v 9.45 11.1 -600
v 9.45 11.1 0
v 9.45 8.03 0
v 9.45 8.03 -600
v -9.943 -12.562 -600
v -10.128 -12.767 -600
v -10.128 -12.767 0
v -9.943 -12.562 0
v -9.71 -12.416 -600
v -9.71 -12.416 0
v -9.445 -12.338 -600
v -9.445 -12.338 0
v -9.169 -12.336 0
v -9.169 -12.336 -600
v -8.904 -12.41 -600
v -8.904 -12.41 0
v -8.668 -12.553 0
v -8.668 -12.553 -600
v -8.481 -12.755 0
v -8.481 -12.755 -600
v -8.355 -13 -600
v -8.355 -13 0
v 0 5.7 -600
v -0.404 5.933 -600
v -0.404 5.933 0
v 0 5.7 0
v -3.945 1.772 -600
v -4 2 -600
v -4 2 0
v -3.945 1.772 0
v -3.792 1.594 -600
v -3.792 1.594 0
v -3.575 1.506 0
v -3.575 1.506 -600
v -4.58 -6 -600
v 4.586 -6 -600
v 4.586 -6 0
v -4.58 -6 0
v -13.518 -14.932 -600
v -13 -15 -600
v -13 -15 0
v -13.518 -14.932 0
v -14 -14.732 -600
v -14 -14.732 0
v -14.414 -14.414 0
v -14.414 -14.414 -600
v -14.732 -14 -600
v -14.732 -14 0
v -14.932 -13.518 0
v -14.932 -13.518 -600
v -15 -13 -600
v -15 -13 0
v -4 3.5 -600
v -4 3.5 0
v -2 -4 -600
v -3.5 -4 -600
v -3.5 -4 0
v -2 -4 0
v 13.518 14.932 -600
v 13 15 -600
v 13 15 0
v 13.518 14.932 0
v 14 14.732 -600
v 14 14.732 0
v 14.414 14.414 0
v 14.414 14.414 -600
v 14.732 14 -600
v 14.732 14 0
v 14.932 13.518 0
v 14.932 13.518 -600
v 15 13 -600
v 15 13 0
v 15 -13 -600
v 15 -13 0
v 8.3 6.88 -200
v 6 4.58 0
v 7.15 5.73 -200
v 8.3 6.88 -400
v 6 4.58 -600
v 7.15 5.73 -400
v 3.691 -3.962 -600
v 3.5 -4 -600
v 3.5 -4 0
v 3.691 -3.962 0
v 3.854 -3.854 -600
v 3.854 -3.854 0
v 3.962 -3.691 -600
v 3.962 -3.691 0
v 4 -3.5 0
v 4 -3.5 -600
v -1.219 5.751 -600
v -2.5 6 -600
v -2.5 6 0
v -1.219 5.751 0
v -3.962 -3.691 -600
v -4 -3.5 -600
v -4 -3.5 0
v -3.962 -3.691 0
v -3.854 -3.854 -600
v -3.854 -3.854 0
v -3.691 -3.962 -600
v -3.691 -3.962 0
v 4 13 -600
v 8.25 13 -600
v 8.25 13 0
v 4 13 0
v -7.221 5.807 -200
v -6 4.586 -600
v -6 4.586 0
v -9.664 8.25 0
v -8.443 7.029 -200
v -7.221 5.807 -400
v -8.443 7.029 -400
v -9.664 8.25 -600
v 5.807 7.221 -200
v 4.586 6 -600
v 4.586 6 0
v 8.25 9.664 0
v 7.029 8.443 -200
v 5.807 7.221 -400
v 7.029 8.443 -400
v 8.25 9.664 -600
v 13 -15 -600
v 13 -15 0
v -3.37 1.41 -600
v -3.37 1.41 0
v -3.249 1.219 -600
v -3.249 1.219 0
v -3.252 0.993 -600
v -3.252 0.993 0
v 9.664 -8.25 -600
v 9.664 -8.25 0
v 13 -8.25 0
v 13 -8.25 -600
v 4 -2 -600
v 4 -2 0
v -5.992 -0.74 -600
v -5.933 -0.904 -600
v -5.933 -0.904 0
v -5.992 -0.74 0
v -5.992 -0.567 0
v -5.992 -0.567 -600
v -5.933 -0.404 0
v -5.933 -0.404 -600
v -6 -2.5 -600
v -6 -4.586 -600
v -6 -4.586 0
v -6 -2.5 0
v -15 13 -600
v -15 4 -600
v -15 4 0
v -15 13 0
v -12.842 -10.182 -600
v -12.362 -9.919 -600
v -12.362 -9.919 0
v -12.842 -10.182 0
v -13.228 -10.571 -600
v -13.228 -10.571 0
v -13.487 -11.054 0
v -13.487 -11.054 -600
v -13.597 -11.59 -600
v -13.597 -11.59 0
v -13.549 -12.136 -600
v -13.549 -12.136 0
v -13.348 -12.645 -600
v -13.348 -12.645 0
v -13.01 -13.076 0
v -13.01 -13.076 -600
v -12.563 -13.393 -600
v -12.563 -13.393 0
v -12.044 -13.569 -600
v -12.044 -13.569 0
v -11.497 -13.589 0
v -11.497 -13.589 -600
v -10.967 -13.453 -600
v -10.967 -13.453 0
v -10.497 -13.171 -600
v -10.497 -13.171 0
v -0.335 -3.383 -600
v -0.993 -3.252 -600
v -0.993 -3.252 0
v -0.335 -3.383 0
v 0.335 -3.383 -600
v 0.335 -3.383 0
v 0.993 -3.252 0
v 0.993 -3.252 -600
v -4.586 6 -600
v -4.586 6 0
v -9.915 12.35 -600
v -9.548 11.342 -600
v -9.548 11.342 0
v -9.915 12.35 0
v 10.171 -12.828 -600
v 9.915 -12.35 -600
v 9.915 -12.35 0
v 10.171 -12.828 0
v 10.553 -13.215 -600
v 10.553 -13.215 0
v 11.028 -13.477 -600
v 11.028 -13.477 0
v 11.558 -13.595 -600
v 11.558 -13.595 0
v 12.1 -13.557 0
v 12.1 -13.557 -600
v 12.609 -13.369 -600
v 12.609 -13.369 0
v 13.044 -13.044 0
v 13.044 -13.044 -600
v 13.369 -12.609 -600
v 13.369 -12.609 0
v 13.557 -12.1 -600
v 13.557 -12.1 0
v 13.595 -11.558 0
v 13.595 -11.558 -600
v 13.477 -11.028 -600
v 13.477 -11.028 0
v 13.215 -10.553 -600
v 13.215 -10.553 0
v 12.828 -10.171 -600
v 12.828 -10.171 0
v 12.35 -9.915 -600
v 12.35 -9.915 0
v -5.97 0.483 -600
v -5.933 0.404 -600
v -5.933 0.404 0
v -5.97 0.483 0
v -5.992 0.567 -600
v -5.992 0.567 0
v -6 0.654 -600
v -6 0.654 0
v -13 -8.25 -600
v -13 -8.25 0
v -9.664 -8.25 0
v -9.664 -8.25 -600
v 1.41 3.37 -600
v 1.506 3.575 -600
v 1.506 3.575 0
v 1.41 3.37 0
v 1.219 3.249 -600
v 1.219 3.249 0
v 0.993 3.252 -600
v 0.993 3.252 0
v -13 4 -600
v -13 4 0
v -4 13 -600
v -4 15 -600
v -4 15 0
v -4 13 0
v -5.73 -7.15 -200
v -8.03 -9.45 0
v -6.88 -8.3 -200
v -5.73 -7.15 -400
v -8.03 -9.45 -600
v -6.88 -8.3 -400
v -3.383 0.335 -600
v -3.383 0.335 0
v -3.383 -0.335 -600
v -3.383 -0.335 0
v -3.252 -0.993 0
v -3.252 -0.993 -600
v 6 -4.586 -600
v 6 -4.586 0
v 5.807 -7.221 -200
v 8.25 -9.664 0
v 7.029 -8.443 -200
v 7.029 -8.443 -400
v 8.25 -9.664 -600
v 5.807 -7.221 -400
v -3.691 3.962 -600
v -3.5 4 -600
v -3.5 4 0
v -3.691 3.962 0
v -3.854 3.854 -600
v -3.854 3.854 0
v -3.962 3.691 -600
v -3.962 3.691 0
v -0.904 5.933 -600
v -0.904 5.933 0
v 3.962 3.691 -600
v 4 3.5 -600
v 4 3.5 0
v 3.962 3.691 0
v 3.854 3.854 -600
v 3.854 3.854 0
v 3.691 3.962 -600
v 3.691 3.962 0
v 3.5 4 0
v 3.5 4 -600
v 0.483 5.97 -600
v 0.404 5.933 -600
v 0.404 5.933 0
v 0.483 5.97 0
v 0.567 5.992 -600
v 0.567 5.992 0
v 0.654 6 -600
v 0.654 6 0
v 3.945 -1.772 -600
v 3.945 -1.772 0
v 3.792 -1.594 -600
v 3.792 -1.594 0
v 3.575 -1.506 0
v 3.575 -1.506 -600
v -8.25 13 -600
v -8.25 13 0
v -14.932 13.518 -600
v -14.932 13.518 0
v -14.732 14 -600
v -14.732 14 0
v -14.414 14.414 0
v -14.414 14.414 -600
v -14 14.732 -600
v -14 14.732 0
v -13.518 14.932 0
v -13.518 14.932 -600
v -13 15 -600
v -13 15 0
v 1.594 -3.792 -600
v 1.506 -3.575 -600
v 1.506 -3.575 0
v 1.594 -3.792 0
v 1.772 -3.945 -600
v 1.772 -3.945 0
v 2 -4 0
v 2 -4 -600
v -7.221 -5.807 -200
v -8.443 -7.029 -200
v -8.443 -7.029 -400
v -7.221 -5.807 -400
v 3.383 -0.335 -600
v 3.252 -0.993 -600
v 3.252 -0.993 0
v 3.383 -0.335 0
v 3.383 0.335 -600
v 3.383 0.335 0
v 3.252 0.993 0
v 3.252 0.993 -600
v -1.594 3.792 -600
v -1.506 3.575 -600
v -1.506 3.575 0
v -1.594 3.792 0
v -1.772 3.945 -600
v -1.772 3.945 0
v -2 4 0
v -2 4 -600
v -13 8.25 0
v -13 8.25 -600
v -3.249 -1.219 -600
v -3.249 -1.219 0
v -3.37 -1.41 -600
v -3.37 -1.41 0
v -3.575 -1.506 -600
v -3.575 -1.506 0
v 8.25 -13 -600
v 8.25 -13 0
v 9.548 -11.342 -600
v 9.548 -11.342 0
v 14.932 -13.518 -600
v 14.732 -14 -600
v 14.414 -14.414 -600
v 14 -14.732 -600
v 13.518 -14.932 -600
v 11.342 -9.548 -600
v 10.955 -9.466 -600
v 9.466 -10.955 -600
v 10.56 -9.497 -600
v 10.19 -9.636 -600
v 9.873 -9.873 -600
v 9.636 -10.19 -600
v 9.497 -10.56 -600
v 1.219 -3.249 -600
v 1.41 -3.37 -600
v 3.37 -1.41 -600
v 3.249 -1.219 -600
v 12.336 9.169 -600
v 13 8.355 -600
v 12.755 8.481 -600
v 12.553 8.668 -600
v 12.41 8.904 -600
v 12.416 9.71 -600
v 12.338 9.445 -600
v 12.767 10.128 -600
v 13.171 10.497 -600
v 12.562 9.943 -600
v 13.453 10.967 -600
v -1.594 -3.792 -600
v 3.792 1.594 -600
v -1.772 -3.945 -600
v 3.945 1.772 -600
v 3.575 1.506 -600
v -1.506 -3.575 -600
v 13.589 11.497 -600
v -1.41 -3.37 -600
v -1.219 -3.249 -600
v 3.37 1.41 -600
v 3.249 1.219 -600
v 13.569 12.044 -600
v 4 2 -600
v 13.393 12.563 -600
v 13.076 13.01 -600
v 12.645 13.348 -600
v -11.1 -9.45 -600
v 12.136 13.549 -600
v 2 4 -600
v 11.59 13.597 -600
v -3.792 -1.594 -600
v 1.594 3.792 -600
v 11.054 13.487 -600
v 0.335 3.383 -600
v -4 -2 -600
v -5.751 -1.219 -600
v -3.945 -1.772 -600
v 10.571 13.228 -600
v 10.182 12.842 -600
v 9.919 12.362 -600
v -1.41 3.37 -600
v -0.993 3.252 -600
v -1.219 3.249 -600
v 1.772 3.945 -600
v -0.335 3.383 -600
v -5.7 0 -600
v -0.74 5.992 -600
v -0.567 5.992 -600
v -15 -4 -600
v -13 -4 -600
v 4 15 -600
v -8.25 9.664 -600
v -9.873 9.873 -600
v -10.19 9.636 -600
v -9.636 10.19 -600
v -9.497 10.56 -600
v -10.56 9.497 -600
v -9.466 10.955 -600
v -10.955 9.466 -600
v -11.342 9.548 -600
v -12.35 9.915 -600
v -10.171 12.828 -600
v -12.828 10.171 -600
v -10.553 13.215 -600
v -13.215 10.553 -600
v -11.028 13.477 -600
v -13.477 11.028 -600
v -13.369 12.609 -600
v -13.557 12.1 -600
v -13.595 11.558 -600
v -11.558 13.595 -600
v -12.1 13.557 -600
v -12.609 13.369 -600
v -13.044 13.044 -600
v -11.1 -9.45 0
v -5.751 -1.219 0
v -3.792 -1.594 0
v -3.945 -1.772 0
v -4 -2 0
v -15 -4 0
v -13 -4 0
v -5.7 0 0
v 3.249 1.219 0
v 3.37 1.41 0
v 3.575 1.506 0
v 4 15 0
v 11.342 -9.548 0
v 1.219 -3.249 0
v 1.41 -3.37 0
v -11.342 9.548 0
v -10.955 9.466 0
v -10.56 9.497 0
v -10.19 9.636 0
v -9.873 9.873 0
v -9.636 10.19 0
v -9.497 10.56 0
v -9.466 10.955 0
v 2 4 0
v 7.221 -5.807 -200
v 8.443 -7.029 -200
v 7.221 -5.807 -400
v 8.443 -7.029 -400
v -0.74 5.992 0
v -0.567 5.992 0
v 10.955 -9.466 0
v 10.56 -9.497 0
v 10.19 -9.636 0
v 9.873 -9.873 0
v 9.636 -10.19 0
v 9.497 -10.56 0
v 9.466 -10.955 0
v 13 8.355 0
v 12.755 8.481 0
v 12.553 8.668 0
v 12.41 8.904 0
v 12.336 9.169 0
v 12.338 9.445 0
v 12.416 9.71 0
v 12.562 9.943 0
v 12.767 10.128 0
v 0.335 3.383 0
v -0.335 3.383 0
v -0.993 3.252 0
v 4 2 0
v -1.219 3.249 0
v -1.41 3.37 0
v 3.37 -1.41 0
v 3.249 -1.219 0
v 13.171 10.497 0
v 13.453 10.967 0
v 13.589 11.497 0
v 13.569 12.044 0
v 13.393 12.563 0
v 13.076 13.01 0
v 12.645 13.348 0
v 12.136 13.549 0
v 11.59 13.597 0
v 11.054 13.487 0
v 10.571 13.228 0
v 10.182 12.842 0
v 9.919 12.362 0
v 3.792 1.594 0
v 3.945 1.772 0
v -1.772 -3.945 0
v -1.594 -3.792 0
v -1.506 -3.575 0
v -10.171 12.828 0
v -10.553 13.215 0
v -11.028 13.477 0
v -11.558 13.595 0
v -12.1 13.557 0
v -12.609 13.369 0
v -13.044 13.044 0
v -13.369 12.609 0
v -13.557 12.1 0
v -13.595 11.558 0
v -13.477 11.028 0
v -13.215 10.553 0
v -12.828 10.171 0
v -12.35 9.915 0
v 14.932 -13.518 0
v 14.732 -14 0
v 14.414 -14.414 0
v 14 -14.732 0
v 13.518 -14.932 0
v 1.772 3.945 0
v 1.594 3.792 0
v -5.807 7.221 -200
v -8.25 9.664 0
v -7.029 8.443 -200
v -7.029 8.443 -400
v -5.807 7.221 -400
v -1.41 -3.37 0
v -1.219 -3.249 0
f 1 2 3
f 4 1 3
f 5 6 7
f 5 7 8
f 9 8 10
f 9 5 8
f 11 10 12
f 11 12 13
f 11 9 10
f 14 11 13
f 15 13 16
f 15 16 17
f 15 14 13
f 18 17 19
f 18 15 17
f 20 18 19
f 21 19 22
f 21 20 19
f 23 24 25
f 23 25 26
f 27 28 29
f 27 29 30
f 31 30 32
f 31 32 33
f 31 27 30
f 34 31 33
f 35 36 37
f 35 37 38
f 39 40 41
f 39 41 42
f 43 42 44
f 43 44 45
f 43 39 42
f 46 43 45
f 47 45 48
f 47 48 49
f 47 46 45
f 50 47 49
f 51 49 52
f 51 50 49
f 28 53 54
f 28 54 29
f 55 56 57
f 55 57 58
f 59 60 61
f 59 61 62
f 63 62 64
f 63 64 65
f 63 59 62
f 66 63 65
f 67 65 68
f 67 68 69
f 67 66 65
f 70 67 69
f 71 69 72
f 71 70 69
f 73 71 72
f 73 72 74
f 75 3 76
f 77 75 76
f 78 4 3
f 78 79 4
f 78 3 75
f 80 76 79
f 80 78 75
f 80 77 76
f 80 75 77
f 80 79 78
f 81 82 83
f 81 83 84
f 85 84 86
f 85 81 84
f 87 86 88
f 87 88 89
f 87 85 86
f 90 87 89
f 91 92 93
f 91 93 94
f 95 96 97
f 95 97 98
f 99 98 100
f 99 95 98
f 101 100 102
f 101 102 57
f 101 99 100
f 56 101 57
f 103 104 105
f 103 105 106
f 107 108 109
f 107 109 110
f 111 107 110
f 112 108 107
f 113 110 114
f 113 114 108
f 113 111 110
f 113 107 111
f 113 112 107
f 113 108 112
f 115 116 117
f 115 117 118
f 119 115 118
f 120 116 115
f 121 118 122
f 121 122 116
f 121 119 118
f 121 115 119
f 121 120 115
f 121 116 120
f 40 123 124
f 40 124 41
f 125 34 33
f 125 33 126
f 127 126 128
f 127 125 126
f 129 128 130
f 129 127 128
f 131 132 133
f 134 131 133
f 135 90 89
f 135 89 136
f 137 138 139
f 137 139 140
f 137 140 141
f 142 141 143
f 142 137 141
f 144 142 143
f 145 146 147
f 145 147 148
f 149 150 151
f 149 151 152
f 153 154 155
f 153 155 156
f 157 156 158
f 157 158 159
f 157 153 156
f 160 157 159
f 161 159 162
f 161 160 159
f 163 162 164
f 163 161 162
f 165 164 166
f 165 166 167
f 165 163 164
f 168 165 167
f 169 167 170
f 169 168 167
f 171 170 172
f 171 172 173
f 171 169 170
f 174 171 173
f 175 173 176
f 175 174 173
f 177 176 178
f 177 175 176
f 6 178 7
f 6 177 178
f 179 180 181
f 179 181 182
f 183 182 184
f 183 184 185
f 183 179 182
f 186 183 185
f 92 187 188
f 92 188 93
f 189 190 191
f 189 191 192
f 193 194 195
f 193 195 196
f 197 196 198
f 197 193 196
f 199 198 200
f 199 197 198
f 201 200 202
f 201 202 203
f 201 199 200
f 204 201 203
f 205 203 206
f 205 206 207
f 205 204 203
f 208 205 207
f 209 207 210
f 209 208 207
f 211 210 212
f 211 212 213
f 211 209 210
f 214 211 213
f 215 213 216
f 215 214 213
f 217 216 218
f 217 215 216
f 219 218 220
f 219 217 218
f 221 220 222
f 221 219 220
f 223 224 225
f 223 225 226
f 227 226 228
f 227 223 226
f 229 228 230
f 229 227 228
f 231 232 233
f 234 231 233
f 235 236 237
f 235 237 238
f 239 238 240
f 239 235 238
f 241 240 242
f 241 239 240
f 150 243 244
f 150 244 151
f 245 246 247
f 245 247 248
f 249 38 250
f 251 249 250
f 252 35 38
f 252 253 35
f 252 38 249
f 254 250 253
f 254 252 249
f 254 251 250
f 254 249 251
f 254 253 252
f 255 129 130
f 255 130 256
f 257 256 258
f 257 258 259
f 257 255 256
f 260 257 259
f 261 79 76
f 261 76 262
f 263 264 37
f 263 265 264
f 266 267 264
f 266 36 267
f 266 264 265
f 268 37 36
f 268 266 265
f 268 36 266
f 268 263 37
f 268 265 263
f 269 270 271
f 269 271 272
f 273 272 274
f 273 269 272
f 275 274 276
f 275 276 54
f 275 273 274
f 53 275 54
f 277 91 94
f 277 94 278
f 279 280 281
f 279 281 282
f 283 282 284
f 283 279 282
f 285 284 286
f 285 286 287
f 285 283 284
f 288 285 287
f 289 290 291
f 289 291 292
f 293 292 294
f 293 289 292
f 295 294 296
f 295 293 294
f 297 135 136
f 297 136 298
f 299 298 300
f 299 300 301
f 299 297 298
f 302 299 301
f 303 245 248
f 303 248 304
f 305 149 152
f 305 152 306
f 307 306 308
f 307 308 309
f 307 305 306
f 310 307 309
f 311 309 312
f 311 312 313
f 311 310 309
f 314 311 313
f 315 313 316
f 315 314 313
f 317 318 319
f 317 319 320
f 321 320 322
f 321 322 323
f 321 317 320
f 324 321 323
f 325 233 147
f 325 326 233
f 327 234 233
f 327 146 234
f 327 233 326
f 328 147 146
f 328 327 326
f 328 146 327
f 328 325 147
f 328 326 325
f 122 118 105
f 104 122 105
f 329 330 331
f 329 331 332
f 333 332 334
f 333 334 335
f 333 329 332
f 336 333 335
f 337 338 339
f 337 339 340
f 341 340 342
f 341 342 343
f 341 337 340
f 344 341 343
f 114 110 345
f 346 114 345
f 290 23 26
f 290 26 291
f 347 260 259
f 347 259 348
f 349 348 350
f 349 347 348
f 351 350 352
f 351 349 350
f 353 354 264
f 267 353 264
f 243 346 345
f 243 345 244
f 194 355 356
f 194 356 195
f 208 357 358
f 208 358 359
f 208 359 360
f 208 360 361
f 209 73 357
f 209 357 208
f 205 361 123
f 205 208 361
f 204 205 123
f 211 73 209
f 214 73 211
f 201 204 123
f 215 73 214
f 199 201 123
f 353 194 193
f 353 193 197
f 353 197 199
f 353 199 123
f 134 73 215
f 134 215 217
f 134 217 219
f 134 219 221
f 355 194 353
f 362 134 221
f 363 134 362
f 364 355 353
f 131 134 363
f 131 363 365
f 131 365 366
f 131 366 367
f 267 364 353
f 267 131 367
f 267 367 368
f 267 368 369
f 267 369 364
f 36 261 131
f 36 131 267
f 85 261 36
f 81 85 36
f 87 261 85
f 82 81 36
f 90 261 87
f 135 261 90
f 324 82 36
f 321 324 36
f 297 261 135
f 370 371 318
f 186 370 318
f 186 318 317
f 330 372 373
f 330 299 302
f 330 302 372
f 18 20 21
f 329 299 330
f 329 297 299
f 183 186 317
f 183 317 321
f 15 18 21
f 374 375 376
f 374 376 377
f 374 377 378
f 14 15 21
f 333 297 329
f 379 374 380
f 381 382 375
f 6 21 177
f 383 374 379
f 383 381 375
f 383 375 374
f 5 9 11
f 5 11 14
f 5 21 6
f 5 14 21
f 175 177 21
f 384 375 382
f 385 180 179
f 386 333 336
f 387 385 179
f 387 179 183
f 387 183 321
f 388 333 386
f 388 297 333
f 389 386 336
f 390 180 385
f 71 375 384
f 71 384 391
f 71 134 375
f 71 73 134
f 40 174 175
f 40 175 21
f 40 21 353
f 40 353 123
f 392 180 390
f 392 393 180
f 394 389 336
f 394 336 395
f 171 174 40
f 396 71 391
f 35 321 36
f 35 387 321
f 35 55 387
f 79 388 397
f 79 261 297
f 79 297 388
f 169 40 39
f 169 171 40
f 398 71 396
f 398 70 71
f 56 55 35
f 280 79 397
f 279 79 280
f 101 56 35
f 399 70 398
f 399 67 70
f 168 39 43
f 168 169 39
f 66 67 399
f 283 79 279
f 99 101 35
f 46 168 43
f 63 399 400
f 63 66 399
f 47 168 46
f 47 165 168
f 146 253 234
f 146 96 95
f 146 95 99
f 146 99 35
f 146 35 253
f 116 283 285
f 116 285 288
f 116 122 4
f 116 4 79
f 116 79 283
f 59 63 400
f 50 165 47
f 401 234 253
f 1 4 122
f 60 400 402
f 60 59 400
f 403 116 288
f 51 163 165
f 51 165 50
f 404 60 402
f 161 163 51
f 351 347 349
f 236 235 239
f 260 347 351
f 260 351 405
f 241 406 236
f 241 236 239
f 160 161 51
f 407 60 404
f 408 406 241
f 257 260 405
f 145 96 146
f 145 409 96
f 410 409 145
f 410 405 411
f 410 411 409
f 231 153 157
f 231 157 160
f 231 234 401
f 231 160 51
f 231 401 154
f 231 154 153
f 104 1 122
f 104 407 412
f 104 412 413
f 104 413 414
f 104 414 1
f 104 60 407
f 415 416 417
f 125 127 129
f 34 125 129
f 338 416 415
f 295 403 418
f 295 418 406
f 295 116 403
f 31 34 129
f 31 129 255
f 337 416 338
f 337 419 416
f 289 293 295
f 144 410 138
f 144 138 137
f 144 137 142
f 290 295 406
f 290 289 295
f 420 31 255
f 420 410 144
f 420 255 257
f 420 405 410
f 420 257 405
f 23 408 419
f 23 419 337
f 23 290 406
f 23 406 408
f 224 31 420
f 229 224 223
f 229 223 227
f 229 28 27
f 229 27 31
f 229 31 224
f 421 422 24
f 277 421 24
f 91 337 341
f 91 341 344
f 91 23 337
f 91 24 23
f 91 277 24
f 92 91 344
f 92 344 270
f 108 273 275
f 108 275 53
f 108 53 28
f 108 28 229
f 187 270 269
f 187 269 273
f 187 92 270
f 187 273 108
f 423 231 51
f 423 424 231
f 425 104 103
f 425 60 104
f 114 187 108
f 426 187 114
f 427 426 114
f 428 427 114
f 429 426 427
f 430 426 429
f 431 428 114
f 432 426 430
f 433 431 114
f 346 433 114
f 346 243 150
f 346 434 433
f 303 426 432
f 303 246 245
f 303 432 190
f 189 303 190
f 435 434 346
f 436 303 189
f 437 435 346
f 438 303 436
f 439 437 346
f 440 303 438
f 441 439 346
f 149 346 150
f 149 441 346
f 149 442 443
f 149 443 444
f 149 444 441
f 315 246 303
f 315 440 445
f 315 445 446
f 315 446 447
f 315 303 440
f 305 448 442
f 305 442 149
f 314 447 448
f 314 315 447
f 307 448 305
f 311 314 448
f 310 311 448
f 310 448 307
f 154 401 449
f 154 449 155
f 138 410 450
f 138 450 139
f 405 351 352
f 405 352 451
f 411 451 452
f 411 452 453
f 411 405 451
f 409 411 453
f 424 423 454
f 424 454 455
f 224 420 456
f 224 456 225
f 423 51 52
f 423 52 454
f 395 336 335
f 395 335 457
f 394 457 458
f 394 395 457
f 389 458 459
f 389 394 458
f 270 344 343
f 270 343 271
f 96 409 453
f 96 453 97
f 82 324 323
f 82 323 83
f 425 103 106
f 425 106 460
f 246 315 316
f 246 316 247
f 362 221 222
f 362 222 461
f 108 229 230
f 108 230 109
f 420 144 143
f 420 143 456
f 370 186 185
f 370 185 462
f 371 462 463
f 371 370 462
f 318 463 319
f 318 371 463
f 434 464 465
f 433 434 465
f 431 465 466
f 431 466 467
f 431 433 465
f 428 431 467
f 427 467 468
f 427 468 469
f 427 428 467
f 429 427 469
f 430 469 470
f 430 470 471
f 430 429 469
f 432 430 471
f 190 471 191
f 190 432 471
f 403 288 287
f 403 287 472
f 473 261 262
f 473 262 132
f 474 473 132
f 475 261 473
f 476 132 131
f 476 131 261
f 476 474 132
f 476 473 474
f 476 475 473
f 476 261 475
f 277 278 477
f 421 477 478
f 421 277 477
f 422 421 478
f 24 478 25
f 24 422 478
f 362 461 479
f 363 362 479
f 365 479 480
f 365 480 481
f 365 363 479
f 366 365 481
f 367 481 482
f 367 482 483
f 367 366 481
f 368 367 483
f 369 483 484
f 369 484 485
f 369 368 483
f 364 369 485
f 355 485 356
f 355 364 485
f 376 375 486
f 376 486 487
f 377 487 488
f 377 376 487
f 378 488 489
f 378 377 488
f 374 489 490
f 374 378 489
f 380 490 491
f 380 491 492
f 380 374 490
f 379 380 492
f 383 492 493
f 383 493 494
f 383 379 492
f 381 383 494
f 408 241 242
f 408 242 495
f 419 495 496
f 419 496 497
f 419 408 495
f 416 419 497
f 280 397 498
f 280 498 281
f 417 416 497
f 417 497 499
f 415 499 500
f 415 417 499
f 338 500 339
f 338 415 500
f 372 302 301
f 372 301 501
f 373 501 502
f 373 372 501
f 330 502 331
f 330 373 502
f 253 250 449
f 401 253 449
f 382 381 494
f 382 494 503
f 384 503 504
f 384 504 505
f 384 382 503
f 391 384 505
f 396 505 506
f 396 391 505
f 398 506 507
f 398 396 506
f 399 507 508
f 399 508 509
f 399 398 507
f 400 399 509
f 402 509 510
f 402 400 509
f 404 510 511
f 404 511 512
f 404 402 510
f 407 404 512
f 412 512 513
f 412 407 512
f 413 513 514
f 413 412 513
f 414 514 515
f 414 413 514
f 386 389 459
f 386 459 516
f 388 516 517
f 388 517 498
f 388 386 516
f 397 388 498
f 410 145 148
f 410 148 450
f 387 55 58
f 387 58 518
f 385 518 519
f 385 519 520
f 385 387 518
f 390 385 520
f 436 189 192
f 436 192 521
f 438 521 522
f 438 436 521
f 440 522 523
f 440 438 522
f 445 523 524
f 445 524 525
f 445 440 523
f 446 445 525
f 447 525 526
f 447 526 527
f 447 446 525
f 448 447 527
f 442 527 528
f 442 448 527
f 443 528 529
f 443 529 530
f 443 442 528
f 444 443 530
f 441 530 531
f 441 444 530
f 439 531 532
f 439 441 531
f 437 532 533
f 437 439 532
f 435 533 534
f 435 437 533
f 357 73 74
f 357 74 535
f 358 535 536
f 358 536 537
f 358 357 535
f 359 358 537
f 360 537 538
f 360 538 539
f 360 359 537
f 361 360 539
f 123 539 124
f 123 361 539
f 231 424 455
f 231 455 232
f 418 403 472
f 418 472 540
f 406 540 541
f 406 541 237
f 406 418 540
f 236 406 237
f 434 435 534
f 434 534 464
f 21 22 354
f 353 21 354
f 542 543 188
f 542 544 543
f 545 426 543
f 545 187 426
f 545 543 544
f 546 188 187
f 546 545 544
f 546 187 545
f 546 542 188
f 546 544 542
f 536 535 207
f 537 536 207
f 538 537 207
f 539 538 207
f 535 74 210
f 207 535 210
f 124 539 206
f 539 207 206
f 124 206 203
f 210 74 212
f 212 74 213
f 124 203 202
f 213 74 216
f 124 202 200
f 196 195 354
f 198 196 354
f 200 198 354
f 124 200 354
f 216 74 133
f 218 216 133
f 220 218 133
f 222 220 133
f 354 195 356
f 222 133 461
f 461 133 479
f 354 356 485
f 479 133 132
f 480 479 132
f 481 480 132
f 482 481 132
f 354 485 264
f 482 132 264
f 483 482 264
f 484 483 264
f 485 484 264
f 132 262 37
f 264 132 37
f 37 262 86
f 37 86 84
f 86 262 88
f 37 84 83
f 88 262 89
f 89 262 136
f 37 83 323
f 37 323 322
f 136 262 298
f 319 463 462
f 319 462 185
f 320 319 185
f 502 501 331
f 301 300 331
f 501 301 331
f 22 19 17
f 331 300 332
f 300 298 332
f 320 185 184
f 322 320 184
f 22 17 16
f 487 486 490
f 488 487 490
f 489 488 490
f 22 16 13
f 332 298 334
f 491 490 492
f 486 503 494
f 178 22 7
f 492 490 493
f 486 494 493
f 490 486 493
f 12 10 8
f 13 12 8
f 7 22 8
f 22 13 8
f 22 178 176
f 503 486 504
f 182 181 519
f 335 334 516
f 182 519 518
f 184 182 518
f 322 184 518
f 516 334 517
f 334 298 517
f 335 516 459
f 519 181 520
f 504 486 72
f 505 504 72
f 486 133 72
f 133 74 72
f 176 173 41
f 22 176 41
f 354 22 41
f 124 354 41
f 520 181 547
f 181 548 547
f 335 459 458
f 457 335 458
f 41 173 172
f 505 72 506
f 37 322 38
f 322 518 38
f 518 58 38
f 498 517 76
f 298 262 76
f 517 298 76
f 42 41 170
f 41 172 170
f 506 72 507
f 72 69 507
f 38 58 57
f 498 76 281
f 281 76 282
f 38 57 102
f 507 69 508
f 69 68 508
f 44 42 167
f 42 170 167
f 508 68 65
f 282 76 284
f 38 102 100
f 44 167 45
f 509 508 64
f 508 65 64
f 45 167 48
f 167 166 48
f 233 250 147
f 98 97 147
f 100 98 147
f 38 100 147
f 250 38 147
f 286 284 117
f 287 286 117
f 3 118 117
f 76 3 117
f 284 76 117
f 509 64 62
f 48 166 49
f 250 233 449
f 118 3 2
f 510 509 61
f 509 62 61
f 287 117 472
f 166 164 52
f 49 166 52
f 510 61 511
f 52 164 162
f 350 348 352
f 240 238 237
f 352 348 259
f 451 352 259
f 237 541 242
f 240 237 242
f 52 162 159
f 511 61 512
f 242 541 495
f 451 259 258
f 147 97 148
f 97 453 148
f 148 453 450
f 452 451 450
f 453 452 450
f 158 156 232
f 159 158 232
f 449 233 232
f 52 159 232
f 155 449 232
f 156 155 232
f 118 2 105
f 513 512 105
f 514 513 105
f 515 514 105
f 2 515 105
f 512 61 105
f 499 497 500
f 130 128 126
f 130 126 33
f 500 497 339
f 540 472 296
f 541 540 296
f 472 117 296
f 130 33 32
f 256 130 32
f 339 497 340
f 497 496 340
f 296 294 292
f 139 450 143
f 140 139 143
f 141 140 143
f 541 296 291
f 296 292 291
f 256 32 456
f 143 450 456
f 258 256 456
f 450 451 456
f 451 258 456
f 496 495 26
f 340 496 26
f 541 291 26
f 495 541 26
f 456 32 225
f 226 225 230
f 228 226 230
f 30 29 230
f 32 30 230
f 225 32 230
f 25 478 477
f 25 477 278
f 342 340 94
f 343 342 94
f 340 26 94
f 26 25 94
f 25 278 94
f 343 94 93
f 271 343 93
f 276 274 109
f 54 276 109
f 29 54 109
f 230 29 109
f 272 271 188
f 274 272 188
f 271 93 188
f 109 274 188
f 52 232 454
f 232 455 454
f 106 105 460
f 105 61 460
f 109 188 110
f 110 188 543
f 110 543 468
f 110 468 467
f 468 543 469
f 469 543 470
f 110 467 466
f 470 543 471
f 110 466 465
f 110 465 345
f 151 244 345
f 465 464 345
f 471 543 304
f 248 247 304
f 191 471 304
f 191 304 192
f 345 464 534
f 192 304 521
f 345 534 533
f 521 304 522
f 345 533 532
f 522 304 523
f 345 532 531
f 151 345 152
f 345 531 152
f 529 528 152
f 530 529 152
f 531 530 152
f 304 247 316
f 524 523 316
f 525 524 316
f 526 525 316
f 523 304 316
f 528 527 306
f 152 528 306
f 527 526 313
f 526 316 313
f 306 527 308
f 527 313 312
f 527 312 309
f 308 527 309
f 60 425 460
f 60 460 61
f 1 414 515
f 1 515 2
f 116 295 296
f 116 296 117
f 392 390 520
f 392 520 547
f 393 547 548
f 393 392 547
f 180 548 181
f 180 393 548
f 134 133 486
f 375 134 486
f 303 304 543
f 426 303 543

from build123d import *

# Parameters (mm, degrees)
ESTRUSIONE_ESTRUSIONE1_DEPTH = 600


with BuildPart() as part:
    # Schizzo1 → Estrusione-Estrusione1 (new body)
    with BuildSketch(Plane(origin=(0, 0, -600), x_dir=(-1, 0, 0), z_dir=(0, 0, -1))):
        with BuildLine():
            Line((-15, 13), (-15, -13))
            ThreePointArc((-15, -13), (-14.414213562, -14.414213562), (-13, -15))
            Line((-13, -15), (13, -15))
            ThreePointArc((13, -15), (14.414213562, -14.414213562), (15, -13))
            Line((15, -13), (15, -4))
            Line((15, -4), (13, -4))
            Line((13, -4), (13, -8.25))
            Line((13, -8.25), (9.664213562, -8.25))
            add(Edge.make_bspline(
                [(9.664213562, -8.25), (8.442809042, -7.028595479), (7.221404521, -5.807190958), (6, -4.585786438)],
                knots=[0, 0, 0, 0, 1, 1, 1, 1], degree=3))
            Line((6, -4.585786438), (6, -2.5))
            Line((6, -2.5), (5.750976629, -1.218885816))
            Line((5.750976629, -1.218885816), (5.933012788, -0.90358969))
            ThreePointArc((5.933012788, -0.90358969), (6, -0.653589753), (5.933012702, -0.403589838))
            Line((5.933012702, -0.403589838), (5.7, 0))
            Line((5.7, 0), (5.933012702, 0.403589838))
            ThreePointArc((5.933012702, 0.403589838), (5.982962913, 0.524180316), (6, 0.653589838))
            Line((6, 0.653589838), (6, 4.585786438))
            add(Edge.make_bspline(
                [(6, 4.585786438), (7.221404521, 5.807190958), (8.442809042, 7.028595479), (9.664213562, 8.25)],
                knots=[0, 0, 0, 0, 1, 1, 1, 1], degree=3))
            Line((9.664213562, 8.25), (13, 8.25))
            Line((13, 8.25), (13, 4))
            Line((13, 4), (15, 4))
            Line((15, 4), (15, 13))
            ThreePointArc((15, 13), (14.414213562, 14.414213562), (13, 15))
            Line((13, 15), (4, 15))
            Line((4, 15), (4, 13))
            Line((4, 13), (8.25, 13))
            Line((8.25, 13), (8.25, 9.664213562))
            add(Edge.make_bspline(
                [(8.25, 9.664213562), (7.028595479, 8.442809042), (5.807190958, 7.221404521), (4.585786438, 6)],
                knots=[0, 0, 0, 0, 1, 1, 1, 1], degree=3))
            Line((4.585786438, 6), (2.5, 6))
            Line((2.5, 6), (1.218885629, 5.750976592))
            Line((1.218885629, 5.750976592), (0.903589838, 5.933012702))
            ThreePointArc((0.903589838, 5.933012702), (0.653589838, 6), (0.403589838, 5.933012702))
            Line((0.403589838, 5.933012702), (0, 5.7))
            Line((0, 5.7), (-0.403589838, 5.933012702))
            ThreePointArc((-0.403589838, 5.933012702), (-0.524180316, 5.982962913), (-0.653589838, 6))
            Line((-0.653589838, 6), (-4.585786438, 6))
            add(Edge.make_bspline(
                [(-4.585786438, 6), (-5.807190958, 7.221404521), (-7.028595479, 8.442809042), (-8.25, 9.664213562)],
                knots=[0, 0, 0, 0, 1, 1, 1, 1], degree=3))
            Line((-8.25, 9.664213562), (-8.25, 13))
            Line((-8.25, 13), (-4, 13))
            Line((-4, 13), (-4, 15))
            Line((-4, 15), (-13, 15))
            ThreePointArc((-13, 15), (-14.414213562, 14.414213562), (-15, 13))
        make_face()
        with BuildLine():
            Line((12.349838066, 9.914583088), (11.34224826, 9.54785039))
            ThreePointArc((11.34224826, 9.54785039), (9.873470565, 9.873470565), (9.54785039, 11.34224826))
            Line((9.54785039, 11.34224826), (9.914583088, 12.349838066))
            ThreePointArc((9.914583088, 12.349838066), (13.043502884, 13.043502884), (12.349838066, 9.914583088))
        make_face(mode=Mode.SUBTRACT)
        with BuildLine():
            Line((-4.585786438, -6), (4.58, -6))
            add(Edge.make_bspline(
                [(4.58, -6), (5.73, -7.15), (6.88, -8.3), (8.03, -9.45)],
                knots=[0, 0, 0, 0, 1, 1, 1, 1], degree=3))
            Line((8.03, -9.45), (11.1, -9.45))
            Line((11.1, -9.45), (12.361944654, -9.919036981))
            ThreePointArc((12.361944654, -9.919036981), (13.194761433, -12.872897378), (10.127586207, -12.766543418))
            ThreePointArc((10.127586207, -12.766543418), (9.169403304, -12.336446483), (8.355281336, -13))
            Line((8.355281336, -13), (-8.25, -13))
            Line((-8.25, -13), (-8.25, -9.664213562))
            add(Edge.make_bspline(
                [(-8.25, -9.664213562), (-7.028595479, -8.442809042), (-5.807190958, -7.221404521), (-4.585786438, -6)],
                knots=[0, 0, 0, 0, 1, 1, 1, 1], degree=3))
        make_face(mode=Mode.SUBTRACT)
        with BuildLine():
            Line((-9.919036981, 12.361944654), (-9.45, 11.1))
            Line((-9.45, 11.1), (-9.45, 8.03))
            add(Edge.make_bspline(
                [(-9.45, 8.03), (-8.3, 6.88), (-7.15, 5.73), (-6, 4.58)],
                knots=[0, 0, 0, 0, 1, 1, 1, 1], degree=3))
            Line((-6, 4.58), (-6, -4.585786438))
            add(Edge.make_bspline(
                [(-6, -4.585786438), (-7.221404521, -5.807190958), (-8.442809042, -7.028595479), (-9.664213562, -8.25)],
                knots=[0, 0, 0, 0, 1, 1, 1, 1], degree=3))
            Line((-9.664213562, -8.25), (-13, -8.25))
            Line((-13, -8.25), (-13, 8.355281336))
            ThreePointArc((-13, 8.355281336), (-12.336446483, 9.169403304), (-12.766543418, 10.127586207))
            ThreePointArc((-12.766543418, 10.127586207), (-12.872897378, 13.194761433), (-9.919036981, 12.361944654))
        make_face(mode=Mode.SUBTRACT)
        with BuildLine():
            Line((-9.54785039, -11.34224826), (-9.914583088, -12.349838066))
            ThreePointArc((-9.914583088, -12.349838066), (-13.043502884, -13.043502884), (-12.349838066, -9.914583088))
            Line((-12.349838066, -9.914583088), (-11.34224826, -9.54785039))
            ThreePointArc((-11.34224826, -9.54785039), (-9.873470565, -9.873470565), (-9.54785039, -11.34224826))
        make_face(mode=Mode.SUBTRACT)
        with BuildLine():
            Line((4, 3.5), (4, 2))
            ThreePointArc((4, 2), (3.879005736, 1.673879391), (3.574581393, 1.505593673))
            ThreePointArc((3.574581393, 1.505593673), (3.295837094, 1.323326833), (3.251694243, 0.993219284))
            ThreePointArc((3.251694243, 0.993219284), (3.4, 0), (3.251694243, -0.993219284))
            ThreePointArc((3.251694243, -0.993219284), (3.295837094, -1.323326833), (3.574581393, -1.505593673))
            ThreePointArc((3.574581393, -1.505593673), (3.879005736, -1.673879391), (4, -2))
            Line((4, -2), (4, -3.5))
            ThreePointArc((4, -3.5), (3.853553391, -3.853553391), (3.5, -4))
            Line((3.5, -4), (2, -4))
            ThreePointArc((2, -4), (1.673879391, -3.879005736), (1.505593673, -3.574581393))
            ThreePointArc((1.505593673, -3.574581393), (1.323326833, -3.295837094), (0.993219284, -3.251694243))
            ThreePointArc((0.993219284, -3.251694243), (0, -3.4), (-0.993219284, -3.251694243))
            ThreePointArc((-0.993219284, -3.251694243), (-1.323326833, -3.295837094), (-1.505593673, -3.574581393))
            ThreePointArc((-1.505593673, -3.574581393), (-1.673879391, -3.879005736), (-2, -4))
            Line((-2, -4), (-3.5, -4))
            ThreePointArc((-3.5, -4), (-3.853553391, -3.853553391), (-4, -3.5))
            Line((-4, -3.5), (-4, -2))
            ThreePointArc((-4, -2), (-3.879005736, -1.673879391), (-3.574581393, -1.505593673))
            ThreePointArc((-3.574581393, -1.505593673), (-3.295837094, -1.323326833), (-3.251694243, -0.993219284))
            ThreePointArc((-3.251694243, -0.993219284), (-3.4, 0), (-3.251694243, 0.993219284))
            ThreePointArc((-3.251694243, 0.993219284), (-3.295837094, 1.323326833), (-3.574581393, 1.505593673))
            ThreePointArc((-3.574581393, 1.505593673), (-3.879005736, 1.673879391), (-4, 2))
            Line((-4, 2), (-4, 3.5))
            ThreePointArc((-4, 3.5), (-3.853553391, 3.853553391), (-3.5, 4))
            Line((-3.5, 4), (-2, 4))
            ThreePointArc((-2, 4), (-1.673879391, 3.879005736), (-1.505593673, 3.574581393))
            ThreePointArc((-1.505593673, 3.574581393), (-1.323326833, 3.295837094), (-0.993219284, 3.251694243))
            ThreePointArc((-0.993219284, 3.251694243), (0, 3.4), (0.993219284, 3.251694243))
            ThreePointArc((0.993219284, 3.251694243), (1.323326833, 3.295837094), (1.505593673, 3.574581393))
            ThreePointArc((1.505593673, 3.574581393), (1.673879391, 3.879005736), (2, 4))
            Line((2, 4), (3.5, 4))
            ThreePointArc((3.5, 4), (3.853553391, 3.853553391), (4, 3.5))
        make_face(mode=Mode.SUBTRACT)
    extrude(amount=-ESTRUSIONE_ESTRUSIONE1_DEPTH)


solid = part.part
